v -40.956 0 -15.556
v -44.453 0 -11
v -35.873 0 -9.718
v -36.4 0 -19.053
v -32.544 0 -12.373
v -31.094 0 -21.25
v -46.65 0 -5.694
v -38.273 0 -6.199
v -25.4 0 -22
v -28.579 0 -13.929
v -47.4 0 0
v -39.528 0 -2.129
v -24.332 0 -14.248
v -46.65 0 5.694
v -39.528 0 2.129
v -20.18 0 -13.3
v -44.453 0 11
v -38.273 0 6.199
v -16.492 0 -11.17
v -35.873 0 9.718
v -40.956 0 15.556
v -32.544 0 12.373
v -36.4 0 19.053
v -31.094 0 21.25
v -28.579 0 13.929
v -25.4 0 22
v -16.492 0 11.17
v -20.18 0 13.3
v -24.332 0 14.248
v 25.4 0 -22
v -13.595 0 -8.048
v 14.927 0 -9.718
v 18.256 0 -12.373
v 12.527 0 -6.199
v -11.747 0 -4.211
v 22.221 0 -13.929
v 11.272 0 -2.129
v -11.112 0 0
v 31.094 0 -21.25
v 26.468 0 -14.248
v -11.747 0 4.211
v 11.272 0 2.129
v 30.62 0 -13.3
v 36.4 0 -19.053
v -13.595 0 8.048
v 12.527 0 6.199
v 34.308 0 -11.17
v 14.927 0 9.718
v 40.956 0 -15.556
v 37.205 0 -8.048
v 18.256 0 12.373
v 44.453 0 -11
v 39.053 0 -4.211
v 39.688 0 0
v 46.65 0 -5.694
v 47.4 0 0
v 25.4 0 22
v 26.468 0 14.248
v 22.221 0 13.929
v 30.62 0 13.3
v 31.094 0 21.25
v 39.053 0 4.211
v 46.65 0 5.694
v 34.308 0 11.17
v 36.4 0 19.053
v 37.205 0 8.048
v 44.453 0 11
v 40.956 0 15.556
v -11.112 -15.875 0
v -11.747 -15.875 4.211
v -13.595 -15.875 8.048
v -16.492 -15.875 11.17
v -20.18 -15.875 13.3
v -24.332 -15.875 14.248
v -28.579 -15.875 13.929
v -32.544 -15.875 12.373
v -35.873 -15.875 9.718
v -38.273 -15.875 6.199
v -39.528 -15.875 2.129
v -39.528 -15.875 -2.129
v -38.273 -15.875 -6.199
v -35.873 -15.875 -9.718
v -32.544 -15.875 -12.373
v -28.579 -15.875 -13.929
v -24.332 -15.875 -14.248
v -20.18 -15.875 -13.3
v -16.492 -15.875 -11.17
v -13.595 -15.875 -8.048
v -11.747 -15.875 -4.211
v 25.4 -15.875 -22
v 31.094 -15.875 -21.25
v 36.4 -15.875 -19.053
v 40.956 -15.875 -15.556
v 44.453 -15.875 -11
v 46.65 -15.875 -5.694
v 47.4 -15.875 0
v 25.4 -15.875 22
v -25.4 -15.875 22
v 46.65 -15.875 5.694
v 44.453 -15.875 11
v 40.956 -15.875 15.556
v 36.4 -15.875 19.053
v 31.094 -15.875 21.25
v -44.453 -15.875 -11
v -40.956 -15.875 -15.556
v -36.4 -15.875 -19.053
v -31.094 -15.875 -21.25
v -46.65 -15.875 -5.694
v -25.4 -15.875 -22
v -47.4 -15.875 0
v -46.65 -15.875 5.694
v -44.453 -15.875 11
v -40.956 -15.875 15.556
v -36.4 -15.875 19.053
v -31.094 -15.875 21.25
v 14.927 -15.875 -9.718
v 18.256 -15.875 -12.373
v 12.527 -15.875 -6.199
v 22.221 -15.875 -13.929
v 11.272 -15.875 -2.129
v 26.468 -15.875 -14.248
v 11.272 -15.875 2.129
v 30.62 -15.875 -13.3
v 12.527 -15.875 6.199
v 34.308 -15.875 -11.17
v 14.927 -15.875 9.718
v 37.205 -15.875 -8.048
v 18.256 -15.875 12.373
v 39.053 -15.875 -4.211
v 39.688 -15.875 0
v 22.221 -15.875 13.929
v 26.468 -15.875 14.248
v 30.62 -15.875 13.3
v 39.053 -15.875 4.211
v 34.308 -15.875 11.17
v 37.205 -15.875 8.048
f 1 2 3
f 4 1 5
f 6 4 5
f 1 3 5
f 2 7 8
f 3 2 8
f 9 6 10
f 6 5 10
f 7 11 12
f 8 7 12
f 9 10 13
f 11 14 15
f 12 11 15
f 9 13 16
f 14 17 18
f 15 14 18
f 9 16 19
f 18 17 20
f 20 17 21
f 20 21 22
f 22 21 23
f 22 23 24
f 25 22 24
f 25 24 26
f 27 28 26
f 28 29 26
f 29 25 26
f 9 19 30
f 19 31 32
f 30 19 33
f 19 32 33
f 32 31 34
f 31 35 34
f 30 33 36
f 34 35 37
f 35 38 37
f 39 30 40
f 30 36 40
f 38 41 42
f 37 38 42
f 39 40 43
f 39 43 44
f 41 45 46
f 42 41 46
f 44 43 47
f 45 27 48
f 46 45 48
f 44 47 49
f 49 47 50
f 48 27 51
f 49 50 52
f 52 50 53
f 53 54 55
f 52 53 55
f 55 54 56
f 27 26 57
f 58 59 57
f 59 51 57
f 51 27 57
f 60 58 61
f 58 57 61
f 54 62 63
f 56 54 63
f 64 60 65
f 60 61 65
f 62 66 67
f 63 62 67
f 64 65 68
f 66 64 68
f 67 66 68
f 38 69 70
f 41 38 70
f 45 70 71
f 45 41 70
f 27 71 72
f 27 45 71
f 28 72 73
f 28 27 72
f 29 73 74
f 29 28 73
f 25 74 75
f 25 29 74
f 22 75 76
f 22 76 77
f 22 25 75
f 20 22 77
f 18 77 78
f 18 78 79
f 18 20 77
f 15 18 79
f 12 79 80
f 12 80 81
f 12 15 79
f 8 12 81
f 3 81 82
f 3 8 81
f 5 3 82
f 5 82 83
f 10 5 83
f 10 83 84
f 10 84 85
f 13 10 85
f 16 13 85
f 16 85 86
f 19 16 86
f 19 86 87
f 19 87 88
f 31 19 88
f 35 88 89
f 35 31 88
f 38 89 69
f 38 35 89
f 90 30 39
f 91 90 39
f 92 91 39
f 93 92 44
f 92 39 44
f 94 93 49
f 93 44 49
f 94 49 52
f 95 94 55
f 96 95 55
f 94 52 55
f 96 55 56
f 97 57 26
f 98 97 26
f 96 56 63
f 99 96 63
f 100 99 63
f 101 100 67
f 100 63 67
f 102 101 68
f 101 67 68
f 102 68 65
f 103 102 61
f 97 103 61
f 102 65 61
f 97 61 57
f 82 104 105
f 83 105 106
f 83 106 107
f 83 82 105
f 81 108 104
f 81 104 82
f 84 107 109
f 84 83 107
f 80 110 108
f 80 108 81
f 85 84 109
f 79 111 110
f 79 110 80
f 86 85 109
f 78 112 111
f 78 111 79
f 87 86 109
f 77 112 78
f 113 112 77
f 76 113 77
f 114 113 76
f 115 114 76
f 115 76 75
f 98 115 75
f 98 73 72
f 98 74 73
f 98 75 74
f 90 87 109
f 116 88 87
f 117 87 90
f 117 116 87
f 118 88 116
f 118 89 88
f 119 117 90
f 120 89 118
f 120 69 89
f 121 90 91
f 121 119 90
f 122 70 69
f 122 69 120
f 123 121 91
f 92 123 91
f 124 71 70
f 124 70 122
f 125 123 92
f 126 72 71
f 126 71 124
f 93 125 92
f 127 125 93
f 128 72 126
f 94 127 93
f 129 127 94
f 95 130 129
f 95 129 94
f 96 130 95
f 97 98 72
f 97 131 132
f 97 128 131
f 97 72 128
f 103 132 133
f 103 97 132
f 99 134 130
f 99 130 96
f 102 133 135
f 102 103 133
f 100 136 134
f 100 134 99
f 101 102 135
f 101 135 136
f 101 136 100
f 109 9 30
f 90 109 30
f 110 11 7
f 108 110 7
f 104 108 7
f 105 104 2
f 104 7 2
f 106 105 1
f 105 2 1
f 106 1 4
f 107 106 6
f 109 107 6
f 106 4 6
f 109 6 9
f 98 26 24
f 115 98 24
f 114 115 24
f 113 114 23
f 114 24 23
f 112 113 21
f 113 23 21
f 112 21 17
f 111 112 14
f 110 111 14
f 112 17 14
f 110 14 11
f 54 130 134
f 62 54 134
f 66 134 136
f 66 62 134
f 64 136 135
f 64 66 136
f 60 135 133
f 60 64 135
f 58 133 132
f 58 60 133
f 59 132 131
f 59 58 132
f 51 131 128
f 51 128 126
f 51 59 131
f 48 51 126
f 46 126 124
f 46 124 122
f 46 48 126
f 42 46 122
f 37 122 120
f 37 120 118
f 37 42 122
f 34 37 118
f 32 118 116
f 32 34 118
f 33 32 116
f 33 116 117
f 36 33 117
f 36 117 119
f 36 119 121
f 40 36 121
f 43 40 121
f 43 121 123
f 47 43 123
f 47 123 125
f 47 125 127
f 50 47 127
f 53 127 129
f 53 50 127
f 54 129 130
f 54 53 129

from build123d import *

# Parameters (mm, degrees)
F0_R     = 14.2875
F1_DEPTH = 15.875


# Not quite as in the source:
# - a length typed as a fraction of an inch, garbled in the dataset ("3 / 203.2 mm" for 3/8 in), is restored
# - a feature names something its author has since deleted; it is built from what else it names


with BuildPart() as f1:
    # F0 (on Front) → F1 (new body)
    with BuildSketch(Plane.XZ):
        with BuildLine():
            Line((25.4, 22), (-25.4, 22))
            ThreePointArc((-25.4, 22), (-40.9563491861, 15.5563491861), (-47.4, 0))
            ThreePointArc((-47.4, 0), (-40.9563491861, -15.5563491861), (-25.4, -22))
            Line((-25.4, -22), (25.4, -22))
            ThreePointArc((25.4, -22), (40.9563491861, -15.5563491861), (47.4, 0))
            ThreePointArc((47.4, 0), (40.9563491861, 15.5563491861), (25.4, 22))
        make_face()
        with Locations((-25.4, 0)):
            Circle(F0_R, mode=Mode.SUBTRACT)
        with Locations((25.4, 0)):
            Circle(F0_R, mode=Mode.SUBTRACT)
    extrude(amount=F1_DEPTH)


solid = f1.part
